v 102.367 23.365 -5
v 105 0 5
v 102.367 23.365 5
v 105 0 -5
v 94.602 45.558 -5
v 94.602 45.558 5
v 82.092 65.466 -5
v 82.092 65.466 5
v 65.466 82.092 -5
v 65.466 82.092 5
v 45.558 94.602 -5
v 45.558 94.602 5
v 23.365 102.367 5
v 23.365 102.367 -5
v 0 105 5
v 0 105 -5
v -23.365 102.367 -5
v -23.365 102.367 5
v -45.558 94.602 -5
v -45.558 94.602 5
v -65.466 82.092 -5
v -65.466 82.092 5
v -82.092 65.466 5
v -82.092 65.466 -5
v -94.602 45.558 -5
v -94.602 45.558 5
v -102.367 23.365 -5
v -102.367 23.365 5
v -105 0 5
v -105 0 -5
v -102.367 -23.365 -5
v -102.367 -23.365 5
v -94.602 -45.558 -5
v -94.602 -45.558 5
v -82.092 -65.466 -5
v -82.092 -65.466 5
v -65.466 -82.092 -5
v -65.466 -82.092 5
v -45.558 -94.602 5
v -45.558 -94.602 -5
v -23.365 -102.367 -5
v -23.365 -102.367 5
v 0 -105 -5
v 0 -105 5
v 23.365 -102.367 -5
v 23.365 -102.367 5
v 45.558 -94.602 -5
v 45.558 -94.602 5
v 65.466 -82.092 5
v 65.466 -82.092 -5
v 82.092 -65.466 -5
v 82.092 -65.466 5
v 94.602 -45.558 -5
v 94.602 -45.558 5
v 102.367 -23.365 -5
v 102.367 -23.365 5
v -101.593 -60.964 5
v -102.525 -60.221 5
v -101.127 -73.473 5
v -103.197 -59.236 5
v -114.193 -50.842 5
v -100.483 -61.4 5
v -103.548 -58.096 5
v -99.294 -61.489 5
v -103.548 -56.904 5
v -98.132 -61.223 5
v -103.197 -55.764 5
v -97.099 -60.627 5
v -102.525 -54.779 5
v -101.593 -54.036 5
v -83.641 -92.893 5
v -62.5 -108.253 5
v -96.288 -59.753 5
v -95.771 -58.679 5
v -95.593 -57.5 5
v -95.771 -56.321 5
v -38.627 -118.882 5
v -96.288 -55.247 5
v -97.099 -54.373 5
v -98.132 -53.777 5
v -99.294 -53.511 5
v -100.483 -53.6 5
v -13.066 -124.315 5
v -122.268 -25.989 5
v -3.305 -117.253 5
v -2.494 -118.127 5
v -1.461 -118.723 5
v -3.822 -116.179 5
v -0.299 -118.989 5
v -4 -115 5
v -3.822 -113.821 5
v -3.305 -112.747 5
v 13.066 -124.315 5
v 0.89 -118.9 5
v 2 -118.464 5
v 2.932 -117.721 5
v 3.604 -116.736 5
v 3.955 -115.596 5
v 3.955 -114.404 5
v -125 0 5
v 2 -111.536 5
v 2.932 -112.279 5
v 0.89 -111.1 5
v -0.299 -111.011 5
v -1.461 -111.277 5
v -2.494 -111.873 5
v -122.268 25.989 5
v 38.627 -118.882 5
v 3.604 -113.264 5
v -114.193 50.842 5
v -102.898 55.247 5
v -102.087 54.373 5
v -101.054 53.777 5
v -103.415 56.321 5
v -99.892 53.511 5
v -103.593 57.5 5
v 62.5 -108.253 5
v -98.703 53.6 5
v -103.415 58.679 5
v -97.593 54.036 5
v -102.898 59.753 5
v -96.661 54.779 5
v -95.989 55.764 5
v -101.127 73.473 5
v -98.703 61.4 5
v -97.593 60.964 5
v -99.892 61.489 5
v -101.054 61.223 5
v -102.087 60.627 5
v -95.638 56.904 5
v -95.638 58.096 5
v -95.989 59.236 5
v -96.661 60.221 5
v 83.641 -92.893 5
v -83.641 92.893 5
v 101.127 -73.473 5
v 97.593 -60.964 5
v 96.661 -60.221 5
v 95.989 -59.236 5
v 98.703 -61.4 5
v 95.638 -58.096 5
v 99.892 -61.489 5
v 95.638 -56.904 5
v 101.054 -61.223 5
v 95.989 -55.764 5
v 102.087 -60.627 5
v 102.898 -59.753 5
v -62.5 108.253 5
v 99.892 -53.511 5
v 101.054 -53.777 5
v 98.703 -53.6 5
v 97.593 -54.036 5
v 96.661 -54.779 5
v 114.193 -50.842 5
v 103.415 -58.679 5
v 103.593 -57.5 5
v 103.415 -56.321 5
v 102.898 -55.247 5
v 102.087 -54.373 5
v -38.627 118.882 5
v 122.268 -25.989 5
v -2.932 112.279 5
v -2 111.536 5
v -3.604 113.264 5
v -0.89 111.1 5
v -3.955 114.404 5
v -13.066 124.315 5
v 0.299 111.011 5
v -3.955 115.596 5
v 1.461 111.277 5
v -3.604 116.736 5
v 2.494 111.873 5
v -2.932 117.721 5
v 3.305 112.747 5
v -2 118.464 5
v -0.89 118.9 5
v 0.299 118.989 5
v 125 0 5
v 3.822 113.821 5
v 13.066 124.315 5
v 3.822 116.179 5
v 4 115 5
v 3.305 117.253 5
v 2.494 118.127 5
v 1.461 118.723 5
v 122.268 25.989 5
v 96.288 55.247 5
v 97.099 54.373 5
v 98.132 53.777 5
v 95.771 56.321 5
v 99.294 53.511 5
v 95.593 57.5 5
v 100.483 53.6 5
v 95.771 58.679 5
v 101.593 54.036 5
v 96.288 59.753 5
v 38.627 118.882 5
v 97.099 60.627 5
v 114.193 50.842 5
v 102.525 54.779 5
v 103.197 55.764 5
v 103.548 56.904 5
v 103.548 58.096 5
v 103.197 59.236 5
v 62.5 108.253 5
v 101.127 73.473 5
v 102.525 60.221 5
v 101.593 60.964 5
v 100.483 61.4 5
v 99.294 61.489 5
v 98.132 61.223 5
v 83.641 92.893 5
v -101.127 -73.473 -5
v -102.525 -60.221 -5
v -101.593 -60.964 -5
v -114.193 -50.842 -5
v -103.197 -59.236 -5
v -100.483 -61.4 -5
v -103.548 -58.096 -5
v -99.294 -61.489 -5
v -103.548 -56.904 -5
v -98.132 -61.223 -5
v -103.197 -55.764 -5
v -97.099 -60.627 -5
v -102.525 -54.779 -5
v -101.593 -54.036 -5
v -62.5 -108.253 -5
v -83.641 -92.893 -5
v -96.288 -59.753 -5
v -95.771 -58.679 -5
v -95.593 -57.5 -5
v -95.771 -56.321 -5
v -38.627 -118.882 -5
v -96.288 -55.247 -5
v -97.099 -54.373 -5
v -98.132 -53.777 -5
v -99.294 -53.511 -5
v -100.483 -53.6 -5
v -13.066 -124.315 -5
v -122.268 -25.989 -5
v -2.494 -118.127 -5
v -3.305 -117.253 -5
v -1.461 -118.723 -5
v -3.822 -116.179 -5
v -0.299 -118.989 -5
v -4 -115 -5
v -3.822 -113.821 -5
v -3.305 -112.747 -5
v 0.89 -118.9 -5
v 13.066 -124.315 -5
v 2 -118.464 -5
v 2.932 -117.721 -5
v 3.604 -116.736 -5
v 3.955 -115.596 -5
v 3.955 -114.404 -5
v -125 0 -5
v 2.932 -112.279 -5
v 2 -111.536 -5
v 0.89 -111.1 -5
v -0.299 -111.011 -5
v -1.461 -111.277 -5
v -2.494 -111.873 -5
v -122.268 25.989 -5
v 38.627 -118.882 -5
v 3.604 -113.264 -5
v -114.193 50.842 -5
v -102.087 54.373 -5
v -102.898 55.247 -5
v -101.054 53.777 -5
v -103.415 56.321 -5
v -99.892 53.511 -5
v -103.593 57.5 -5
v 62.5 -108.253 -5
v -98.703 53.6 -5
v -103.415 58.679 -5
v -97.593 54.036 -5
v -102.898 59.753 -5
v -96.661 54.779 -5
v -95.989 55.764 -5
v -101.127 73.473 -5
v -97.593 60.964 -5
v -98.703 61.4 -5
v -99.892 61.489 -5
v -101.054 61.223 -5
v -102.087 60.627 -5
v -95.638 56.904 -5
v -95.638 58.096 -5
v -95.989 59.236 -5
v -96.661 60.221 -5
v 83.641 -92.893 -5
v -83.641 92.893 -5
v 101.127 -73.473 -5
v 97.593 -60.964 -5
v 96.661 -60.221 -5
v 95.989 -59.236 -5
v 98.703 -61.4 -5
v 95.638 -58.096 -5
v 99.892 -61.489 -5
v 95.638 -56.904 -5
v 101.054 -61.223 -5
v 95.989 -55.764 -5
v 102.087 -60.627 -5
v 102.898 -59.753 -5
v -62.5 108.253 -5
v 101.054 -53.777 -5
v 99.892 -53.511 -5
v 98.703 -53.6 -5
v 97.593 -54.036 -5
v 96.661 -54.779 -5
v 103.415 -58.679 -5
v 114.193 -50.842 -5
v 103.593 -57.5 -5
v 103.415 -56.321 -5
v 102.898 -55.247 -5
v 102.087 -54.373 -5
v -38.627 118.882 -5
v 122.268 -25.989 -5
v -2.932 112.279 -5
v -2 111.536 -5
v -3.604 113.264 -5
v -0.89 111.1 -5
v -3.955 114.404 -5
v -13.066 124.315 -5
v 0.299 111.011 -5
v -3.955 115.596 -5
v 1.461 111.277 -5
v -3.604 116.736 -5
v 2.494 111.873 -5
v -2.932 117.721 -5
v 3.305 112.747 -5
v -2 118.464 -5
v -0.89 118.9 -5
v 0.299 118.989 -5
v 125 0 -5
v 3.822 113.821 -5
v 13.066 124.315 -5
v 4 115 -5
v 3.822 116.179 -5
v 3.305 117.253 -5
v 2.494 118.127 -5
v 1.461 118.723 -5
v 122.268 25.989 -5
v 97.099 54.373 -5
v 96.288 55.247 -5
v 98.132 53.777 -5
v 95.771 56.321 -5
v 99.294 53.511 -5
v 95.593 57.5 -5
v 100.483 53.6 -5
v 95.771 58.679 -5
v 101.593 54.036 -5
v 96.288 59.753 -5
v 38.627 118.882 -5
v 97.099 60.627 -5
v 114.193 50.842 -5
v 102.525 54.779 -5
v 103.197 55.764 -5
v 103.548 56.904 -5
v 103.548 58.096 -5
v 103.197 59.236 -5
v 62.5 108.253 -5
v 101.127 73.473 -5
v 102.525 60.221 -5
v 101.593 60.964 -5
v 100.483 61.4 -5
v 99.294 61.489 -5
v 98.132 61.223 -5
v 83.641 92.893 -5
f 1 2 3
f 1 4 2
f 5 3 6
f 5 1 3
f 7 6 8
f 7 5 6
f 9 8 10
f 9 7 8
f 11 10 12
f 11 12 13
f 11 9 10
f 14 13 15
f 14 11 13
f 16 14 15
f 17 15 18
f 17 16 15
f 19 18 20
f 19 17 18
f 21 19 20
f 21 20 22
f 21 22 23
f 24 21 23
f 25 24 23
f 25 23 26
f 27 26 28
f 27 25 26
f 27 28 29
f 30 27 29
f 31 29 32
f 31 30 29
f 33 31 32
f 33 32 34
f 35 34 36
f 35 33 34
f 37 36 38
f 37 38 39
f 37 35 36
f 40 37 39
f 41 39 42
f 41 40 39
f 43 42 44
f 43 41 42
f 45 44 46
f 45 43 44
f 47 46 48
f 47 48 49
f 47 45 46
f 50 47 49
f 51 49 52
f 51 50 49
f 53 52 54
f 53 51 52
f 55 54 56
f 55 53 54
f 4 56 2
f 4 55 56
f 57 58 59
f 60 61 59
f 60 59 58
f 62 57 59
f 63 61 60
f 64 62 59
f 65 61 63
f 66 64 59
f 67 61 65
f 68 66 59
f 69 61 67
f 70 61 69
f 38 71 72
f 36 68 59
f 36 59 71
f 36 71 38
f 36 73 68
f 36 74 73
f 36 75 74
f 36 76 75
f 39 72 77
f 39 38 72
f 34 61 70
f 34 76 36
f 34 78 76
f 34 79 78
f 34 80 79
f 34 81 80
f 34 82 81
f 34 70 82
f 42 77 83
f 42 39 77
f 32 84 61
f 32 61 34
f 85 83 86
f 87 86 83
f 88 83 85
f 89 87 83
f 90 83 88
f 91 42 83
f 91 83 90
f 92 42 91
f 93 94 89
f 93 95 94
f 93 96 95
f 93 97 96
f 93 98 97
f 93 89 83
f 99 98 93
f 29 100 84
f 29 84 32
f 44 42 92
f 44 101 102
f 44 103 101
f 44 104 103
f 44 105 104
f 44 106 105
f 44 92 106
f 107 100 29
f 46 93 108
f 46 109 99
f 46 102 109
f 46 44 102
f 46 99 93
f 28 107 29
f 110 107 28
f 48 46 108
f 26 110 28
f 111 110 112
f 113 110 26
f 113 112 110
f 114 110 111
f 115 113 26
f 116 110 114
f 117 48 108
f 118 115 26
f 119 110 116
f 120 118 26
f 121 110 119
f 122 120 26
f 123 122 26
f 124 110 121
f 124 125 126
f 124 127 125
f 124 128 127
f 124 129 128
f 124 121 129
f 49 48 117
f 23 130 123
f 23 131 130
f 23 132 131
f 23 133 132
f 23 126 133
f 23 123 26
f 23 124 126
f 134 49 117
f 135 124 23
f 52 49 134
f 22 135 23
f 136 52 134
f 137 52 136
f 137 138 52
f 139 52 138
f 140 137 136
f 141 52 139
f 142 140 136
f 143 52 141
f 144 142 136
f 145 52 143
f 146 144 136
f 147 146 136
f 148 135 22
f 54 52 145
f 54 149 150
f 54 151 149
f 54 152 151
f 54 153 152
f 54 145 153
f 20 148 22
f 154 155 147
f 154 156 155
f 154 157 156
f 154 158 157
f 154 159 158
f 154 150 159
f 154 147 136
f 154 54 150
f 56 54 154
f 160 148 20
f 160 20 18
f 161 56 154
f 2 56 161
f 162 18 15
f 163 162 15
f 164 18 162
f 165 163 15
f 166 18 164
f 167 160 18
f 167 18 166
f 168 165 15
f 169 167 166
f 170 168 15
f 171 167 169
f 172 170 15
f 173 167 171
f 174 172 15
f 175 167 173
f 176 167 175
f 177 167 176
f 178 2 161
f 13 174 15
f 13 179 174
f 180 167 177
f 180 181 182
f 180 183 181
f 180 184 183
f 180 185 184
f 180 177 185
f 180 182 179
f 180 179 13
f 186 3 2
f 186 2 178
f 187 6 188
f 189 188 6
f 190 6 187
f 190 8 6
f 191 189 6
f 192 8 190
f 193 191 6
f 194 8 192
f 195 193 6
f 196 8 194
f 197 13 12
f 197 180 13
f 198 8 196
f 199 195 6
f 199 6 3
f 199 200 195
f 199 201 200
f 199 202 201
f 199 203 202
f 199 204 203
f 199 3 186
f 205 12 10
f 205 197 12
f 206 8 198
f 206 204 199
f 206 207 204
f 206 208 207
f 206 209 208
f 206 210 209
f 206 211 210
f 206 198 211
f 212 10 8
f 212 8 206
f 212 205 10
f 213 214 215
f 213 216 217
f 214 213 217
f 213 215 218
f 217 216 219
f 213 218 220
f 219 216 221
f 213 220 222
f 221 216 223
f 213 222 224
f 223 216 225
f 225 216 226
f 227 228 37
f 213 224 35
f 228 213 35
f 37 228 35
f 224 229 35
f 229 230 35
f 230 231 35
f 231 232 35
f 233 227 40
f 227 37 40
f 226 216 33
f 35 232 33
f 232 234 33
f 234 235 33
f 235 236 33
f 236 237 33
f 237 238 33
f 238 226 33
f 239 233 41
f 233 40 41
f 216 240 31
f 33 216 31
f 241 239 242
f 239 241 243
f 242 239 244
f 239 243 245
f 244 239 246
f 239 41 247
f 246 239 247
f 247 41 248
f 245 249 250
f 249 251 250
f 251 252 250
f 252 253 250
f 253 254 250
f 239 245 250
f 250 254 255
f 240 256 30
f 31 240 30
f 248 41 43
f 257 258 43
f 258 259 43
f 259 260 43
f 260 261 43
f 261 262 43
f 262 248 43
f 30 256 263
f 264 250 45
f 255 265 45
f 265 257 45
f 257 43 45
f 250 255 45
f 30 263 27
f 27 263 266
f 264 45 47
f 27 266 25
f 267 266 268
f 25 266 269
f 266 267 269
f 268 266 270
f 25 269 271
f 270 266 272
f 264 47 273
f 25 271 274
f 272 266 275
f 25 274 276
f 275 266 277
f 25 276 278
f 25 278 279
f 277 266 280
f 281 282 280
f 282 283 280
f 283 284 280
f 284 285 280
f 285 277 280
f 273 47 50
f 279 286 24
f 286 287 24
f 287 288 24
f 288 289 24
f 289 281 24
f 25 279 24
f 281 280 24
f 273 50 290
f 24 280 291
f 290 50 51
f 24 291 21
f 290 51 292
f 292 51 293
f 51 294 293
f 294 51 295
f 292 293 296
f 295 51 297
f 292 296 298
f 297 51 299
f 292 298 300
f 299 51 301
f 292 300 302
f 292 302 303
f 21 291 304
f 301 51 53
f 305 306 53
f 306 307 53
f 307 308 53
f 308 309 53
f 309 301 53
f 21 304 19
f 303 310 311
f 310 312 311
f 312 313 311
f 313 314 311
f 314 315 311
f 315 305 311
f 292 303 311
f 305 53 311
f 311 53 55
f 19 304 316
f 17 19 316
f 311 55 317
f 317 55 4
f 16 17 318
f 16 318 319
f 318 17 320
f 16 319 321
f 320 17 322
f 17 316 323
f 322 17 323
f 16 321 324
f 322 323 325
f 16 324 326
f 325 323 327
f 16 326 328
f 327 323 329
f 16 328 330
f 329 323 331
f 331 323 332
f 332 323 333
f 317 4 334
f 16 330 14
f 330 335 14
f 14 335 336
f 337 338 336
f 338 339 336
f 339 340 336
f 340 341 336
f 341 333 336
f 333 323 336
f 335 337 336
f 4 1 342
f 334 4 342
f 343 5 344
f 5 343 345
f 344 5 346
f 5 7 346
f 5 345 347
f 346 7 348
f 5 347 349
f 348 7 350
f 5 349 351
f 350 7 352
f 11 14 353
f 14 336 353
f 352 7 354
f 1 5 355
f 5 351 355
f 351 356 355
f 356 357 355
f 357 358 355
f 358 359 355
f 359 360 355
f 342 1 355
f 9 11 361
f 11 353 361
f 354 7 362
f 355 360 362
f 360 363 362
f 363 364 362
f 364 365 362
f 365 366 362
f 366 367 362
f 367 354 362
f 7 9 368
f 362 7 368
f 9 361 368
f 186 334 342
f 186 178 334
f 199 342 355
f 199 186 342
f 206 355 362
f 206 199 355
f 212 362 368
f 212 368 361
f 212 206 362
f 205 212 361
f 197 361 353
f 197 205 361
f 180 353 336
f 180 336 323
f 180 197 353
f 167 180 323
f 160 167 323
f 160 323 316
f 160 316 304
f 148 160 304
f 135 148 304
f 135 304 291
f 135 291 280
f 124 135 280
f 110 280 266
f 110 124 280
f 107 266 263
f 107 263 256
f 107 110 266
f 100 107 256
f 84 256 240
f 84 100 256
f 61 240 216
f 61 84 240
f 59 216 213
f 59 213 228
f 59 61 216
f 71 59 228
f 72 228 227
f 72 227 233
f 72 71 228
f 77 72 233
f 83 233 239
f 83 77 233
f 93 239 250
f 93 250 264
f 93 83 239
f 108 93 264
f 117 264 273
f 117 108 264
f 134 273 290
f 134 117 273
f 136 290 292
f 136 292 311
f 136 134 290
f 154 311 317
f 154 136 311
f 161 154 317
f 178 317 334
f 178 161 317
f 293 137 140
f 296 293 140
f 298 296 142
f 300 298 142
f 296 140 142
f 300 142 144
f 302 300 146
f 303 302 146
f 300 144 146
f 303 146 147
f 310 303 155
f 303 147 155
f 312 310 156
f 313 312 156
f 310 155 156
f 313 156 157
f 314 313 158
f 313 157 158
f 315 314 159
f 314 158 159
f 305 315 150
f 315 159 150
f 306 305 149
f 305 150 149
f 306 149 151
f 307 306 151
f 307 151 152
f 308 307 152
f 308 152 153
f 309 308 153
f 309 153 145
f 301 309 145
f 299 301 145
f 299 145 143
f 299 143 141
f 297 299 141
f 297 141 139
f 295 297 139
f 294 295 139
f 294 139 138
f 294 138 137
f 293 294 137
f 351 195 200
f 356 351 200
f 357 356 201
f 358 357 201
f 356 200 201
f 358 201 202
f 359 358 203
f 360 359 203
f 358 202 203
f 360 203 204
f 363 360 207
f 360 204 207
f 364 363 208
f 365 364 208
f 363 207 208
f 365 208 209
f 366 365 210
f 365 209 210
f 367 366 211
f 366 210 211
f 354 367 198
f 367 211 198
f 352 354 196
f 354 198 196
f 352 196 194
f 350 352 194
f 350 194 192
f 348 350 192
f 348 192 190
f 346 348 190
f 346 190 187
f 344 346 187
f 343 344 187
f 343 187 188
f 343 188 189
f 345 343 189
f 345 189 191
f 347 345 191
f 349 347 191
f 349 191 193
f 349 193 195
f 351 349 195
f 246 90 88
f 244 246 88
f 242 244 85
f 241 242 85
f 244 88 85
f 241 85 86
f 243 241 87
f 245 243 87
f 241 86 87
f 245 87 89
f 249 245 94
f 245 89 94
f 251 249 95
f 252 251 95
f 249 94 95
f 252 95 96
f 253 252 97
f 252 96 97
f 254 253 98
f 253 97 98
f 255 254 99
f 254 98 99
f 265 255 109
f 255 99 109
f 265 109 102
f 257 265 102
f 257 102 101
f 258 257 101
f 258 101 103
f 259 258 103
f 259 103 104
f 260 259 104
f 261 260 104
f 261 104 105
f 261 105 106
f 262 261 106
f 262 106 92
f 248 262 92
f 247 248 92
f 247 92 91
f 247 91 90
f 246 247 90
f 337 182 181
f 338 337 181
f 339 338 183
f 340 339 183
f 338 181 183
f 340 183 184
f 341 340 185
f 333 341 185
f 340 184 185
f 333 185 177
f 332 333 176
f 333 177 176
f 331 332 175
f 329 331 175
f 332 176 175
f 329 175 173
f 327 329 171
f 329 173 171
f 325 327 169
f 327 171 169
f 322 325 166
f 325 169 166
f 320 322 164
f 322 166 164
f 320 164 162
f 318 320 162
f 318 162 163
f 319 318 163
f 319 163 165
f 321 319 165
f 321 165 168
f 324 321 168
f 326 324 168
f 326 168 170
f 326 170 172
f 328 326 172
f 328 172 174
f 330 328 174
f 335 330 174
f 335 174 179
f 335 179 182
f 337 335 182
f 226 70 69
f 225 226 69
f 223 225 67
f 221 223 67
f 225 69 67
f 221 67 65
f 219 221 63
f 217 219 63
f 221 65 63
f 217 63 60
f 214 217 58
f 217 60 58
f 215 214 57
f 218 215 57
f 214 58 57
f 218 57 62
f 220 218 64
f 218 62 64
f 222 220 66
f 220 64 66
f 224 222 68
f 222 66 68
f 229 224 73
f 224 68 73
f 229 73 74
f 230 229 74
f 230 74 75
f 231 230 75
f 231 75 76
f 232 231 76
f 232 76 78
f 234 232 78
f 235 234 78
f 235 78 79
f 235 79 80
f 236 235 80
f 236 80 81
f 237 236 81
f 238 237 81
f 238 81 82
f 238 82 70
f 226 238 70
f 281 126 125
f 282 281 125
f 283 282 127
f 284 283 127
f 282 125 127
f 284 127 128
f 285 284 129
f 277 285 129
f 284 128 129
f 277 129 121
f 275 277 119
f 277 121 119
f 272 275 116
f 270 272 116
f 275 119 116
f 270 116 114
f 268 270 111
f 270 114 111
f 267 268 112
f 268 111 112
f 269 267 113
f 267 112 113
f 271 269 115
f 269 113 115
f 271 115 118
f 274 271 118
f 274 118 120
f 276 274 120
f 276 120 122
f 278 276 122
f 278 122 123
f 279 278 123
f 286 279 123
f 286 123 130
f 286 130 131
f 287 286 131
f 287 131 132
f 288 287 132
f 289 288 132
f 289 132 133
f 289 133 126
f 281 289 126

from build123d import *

# Parameters (mm, degrees)
SKETCH1_R          = 125
SKETCH1_R_2        = 105
BODY_DEPTH         = 5
SKETCH2_R          = 4
CUT_EXTRUDE1_DEPTH = 11
HOLES_COUNT        = 6


with BuildPart() as part:
    # Sketch1 → Body (new body, symmetric)
    with BuildSketch(Plane.XY):
        Circle(SKETCH1_R)
        Circle(SKETCH1_R_2, mode=Mode.SUBTRACT)
    extrude(amount=BODY_DEPTH, both=True)

    # Sketch2 → Cut-Extrude1 (cut, through all)
    with BuildSketch(Plane.XY.offset(5)):
        with Locations((0, 115)):
            Circle(SKETCH2_R)
    cut_extrude1 = extrude(amount=-CUT_EXTRUDE1_DEPTH, mode=Mode.SUBTRACT)

    # Holes: Cut-Extrude1 ×6 about axis
    holes_axis = Axis((0, 0, 0), (0, 0, 1))
    for i in range(1, HOLES_COUNT):
        add(cut_extrude1.rotate(holes_axis, i * 360 / HOLES_COUNT), mode=Mode.SUBTRACT)


solid = part.part
